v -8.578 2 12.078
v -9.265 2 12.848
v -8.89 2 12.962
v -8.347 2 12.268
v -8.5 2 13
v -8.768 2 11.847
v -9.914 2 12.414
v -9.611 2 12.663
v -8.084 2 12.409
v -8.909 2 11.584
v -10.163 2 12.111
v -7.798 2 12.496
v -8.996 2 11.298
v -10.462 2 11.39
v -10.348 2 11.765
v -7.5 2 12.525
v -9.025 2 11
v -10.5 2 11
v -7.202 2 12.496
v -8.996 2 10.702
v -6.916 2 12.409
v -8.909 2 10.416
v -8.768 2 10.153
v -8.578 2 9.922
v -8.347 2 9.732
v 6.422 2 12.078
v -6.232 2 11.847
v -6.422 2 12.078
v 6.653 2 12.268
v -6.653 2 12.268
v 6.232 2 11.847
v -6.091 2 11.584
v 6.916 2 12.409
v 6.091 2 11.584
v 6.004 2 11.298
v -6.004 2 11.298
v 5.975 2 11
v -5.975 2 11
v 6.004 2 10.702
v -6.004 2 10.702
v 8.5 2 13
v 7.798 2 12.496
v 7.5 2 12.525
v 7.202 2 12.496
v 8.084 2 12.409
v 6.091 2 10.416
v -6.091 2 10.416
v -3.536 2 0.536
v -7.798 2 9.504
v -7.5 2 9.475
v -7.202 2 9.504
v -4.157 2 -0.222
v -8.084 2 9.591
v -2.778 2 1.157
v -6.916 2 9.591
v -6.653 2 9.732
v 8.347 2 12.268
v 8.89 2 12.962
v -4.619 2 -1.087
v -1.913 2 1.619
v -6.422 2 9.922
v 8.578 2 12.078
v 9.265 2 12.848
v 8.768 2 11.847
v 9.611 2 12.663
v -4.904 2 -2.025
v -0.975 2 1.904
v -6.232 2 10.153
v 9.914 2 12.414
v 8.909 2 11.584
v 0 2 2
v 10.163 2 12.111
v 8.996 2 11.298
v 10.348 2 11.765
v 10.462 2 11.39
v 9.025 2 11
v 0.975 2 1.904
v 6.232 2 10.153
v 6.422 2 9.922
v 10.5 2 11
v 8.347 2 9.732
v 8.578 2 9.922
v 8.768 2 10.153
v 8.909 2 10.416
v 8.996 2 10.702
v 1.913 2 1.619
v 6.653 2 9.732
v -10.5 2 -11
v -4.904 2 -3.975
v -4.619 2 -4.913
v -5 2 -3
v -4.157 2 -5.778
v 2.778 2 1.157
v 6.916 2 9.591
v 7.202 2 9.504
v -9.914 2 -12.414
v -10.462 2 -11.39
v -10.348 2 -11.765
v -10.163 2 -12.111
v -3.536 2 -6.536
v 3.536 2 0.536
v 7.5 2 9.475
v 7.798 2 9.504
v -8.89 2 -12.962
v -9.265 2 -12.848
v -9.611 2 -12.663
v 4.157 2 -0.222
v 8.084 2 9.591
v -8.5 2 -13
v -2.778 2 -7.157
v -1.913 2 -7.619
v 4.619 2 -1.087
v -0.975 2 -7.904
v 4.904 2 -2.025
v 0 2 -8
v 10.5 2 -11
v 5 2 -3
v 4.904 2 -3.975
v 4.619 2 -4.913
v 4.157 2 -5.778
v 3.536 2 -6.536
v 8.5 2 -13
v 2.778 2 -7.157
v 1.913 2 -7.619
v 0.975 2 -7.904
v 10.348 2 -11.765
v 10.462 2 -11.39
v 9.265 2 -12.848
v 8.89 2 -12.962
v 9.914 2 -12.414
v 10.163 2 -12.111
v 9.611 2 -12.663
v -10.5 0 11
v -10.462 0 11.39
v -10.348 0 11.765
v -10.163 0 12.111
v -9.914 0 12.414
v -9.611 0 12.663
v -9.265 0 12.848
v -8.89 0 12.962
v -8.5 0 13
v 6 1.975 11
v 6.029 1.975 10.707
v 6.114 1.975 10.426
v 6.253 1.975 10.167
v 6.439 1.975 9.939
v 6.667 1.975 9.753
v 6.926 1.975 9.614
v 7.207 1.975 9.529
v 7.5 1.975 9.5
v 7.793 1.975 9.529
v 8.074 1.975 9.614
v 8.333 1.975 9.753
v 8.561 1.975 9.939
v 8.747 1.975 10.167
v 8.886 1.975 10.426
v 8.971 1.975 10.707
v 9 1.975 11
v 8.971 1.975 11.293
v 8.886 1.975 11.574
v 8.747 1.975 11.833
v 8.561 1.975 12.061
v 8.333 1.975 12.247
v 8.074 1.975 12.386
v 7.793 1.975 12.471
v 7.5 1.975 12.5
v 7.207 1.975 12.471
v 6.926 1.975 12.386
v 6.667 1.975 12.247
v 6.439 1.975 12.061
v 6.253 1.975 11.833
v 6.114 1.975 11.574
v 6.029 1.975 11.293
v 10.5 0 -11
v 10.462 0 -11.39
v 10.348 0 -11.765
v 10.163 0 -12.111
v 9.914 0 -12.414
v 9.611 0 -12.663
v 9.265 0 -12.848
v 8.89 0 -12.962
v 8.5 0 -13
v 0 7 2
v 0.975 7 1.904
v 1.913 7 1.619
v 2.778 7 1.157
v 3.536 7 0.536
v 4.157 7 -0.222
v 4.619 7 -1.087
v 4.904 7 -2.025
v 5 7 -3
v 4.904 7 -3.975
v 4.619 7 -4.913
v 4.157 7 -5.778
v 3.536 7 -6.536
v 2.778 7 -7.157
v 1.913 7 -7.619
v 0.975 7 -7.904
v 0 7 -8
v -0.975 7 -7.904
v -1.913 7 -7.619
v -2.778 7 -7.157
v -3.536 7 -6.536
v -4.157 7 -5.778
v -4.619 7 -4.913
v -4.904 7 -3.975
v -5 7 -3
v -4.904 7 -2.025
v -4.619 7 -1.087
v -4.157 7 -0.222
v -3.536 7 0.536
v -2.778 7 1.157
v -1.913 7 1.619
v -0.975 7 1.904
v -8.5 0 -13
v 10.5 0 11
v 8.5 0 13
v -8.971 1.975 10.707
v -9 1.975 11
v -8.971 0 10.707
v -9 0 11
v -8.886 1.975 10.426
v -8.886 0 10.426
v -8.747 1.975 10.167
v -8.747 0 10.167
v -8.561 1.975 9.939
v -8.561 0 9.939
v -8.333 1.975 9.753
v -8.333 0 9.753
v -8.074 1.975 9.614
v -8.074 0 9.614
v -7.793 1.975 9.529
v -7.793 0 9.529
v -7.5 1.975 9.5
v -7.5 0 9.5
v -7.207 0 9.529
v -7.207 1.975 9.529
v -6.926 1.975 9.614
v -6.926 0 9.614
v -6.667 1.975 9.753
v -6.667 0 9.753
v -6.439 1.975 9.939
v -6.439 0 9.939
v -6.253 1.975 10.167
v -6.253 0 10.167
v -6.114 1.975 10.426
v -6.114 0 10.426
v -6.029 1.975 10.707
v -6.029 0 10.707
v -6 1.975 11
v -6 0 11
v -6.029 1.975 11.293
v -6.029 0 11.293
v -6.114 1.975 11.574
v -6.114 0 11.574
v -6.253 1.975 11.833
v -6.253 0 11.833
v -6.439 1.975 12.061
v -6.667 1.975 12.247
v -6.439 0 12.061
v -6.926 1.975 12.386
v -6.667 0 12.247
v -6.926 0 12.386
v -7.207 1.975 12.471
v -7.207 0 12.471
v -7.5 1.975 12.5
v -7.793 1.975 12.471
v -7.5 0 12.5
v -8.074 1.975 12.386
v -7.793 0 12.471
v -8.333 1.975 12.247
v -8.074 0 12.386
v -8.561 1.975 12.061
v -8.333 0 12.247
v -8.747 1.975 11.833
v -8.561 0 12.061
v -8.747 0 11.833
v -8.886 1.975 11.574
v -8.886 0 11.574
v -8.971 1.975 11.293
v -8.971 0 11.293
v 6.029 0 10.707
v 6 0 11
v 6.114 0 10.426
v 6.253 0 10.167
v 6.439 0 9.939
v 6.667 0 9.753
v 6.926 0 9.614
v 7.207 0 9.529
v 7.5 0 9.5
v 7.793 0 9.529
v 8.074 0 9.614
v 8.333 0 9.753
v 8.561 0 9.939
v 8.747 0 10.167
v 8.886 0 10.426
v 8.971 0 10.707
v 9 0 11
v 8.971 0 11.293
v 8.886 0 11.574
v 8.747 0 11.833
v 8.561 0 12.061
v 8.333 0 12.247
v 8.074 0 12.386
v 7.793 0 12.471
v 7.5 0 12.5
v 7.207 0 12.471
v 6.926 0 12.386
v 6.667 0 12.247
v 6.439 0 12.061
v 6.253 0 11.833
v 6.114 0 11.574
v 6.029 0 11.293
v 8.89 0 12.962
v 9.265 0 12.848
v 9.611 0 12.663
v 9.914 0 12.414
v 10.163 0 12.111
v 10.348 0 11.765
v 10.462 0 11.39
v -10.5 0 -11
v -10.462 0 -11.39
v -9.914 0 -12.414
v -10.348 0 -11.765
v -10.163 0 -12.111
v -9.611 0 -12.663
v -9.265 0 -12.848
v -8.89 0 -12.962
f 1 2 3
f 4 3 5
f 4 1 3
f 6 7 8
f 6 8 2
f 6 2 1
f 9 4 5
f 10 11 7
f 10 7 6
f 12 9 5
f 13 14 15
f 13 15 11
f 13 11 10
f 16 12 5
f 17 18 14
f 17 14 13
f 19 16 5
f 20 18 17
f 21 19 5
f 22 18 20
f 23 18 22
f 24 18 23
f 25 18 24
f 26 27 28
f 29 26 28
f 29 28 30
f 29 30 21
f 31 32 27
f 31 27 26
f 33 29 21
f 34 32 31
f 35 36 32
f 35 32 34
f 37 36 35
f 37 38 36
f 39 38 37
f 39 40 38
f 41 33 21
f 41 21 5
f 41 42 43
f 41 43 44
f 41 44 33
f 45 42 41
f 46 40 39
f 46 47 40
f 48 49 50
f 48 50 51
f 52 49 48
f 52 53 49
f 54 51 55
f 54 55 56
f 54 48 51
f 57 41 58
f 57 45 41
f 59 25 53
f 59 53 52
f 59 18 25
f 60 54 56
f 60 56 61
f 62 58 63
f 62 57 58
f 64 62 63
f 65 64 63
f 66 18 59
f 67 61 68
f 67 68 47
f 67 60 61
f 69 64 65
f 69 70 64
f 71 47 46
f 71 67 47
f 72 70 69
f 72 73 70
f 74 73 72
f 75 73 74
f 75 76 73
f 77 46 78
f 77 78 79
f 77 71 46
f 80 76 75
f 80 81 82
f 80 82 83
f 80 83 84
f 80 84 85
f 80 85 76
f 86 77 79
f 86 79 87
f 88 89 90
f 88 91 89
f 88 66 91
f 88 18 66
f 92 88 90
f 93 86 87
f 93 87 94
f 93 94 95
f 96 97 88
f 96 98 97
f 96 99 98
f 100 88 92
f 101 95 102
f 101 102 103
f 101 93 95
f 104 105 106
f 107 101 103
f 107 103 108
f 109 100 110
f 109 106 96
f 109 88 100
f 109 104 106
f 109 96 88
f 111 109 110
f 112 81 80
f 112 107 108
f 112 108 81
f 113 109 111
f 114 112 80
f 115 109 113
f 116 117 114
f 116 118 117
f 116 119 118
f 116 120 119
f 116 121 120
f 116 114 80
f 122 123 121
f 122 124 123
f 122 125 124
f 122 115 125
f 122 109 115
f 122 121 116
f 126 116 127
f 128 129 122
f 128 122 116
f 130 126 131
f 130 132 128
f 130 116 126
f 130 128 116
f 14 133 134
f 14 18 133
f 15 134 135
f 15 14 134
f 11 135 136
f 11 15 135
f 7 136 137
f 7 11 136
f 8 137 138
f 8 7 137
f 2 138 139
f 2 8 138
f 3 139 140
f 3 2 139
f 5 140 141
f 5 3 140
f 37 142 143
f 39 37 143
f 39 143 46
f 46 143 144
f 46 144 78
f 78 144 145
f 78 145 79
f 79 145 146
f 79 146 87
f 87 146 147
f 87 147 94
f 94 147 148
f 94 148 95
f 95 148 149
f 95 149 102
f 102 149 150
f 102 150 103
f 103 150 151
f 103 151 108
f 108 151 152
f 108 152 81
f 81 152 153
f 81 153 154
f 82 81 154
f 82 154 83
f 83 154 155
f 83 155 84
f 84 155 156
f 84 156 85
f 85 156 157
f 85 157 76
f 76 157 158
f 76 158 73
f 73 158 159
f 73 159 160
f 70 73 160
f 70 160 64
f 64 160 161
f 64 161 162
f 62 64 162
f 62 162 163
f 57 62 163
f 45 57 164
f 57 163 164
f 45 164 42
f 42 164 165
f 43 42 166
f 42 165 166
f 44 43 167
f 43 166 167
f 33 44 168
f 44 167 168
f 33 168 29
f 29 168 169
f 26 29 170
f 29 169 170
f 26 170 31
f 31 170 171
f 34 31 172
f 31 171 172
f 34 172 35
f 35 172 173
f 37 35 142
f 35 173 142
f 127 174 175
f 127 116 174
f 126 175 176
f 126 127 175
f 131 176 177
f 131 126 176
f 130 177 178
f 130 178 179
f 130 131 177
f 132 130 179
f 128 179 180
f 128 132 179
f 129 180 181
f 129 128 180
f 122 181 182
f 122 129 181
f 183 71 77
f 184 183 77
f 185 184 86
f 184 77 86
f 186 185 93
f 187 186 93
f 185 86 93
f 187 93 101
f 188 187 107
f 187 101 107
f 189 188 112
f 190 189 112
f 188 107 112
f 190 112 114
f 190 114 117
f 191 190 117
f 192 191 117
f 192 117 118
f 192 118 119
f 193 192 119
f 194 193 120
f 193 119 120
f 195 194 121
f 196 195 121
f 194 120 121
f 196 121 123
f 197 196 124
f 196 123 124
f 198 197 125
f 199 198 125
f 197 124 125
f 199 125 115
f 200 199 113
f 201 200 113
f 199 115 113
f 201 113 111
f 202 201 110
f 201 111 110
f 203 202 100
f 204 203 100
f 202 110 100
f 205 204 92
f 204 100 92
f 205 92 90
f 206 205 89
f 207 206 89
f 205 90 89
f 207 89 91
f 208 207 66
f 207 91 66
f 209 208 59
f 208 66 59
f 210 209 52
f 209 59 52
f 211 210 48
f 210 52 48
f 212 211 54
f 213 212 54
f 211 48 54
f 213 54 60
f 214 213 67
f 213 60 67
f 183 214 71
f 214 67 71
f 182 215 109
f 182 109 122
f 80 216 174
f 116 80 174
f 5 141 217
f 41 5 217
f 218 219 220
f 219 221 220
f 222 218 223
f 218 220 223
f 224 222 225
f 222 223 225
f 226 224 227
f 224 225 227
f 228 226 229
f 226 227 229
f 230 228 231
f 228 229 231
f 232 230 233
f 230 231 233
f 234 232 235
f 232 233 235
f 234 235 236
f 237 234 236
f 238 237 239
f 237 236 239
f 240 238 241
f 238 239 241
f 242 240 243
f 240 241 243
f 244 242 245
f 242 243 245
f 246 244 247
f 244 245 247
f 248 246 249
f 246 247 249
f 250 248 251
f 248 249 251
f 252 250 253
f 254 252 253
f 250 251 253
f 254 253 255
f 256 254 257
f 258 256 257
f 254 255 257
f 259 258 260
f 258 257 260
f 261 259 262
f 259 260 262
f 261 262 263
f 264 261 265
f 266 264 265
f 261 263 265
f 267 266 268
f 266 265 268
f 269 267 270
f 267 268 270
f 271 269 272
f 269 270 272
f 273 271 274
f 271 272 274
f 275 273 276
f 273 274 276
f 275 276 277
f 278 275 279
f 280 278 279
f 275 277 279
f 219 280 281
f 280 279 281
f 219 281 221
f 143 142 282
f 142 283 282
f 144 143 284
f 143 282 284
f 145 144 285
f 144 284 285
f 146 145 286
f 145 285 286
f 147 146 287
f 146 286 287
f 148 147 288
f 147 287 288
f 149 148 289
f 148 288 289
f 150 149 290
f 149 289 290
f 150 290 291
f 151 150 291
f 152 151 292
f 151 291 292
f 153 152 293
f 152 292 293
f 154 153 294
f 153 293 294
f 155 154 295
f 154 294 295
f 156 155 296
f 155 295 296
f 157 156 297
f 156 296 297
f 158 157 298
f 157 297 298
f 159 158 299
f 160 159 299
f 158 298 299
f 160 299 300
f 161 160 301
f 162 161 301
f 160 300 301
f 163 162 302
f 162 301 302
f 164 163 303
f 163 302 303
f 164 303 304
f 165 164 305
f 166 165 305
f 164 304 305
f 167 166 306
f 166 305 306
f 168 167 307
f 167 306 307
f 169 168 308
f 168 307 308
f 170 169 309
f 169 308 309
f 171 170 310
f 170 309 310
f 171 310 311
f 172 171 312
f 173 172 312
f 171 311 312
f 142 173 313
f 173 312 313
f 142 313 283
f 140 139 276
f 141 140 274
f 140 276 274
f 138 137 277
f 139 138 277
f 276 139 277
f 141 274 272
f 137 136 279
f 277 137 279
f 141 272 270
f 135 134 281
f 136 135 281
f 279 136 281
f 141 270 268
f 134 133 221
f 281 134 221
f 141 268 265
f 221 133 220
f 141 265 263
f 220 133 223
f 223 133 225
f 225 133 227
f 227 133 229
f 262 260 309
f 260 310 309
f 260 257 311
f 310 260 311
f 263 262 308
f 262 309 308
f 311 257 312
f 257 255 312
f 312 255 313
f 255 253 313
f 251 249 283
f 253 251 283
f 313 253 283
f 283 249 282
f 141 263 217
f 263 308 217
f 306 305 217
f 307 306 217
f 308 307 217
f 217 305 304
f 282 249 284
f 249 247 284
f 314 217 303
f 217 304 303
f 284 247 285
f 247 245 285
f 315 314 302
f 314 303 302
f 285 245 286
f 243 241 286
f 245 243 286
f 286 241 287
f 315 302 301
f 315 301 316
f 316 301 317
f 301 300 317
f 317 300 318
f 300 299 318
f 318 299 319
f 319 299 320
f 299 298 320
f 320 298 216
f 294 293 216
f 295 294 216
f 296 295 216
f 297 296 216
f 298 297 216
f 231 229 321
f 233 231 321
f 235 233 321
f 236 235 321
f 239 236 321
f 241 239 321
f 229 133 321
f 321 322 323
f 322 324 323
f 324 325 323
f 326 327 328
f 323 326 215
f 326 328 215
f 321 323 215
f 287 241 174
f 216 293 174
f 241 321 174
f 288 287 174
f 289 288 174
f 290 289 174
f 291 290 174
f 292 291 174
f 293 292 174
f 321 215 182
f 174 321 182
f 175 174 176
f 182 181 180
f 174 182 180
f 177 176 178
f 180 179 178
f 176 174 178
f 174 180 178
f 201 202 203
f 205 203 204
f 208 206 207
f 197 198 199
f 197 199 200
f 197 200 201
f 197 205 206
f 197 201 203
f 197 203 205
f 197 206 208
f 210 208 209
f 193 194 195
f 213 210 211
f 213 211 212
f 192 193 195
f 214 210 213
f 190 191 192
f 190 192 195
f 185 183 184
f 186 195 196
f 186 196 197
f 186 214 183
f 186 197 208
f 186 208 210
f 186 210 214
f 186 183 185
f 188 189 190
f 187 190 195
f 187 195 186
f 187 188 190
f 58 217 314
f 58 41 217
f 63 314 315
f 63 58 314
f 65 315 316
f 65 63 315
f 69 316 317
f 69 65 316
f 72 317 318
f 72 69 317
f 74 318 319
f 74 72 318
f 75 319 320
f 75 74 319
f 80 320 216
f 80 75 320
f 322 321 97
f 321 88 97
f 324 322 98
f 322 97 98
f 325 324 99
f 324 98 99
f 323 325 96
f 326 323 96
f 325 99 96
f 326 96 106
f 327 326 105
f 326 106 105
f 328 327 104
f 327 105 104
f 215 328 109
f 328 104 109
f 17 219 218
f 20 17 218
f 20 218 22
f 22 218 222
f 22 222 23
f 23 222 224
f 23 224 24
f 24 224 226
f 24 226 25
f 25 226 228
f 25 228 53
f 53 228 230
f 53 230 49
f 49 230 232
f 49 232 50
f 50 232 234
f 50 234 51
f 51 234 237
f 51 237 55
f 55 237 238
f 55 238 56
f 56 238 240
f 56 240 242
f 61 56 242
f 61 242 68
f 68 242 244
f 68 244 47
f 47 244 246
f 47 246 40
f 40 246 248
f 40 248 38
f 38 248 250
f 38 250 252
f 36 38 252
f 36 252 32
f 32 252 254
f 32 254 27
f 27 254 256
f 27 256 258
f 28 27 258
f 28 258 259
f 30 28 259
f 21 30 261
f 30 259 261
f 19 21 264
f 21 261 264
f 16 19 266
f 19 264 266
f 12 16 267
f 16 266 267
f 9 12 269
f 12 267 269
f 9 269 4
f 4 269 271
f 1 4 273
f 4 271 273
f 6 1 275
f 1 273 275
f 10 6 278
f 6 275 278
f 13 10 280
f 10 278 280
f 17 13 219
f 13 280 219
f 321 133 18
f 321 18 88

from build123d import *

# Parameters (mm, degrees)
SKETCH1_W                          = 21
SKETCH1_H                          = 26
BOSS_EXTRUDE1_DEPTH                = 2
FILLET1_R                          = 2
SKETCH2_R                          = 5
BOSS_EXTRUDE2_DEPTH                = 5
F_3_0_3_DIAMETER_HOLE1_D           = 3
F_3_0_3_DIAMETER_HOLE1_CSINK_D     = 3.05
F_3_0_3_DIAMETER_HOLE1_CSINK_ANGLE = 90


with BuildPart() as part:
    # Sketch1 → Boss-Extrude1 (new body)
    with BuildSketch(Plane(origin=(0, 0, 0), x_dir=(1, 0, 0), z_dir=(0, 1, 0))):
        Rectangle(SKETCH1_W, SKETCH1_H)
    extrude(amount=BOSS_EXTRUDE1_DEPTH)

    # Fillet1
    fillet1_edges = [part.edges().sort_by_distance(p)[0] for p in [
        (10.5, 1, 13),
        (-10.5, 1, 13),
        (-10.5, 1, -13),
        (10.5, 1, -13),
    ]]
    fillet(fillet1_edges, radius=FILLET1_R)

    # Sketch2 → Boss-Extrude2 (add)
    with BuildSketch(Plane(origin=(0, 2, 0), x_dir=(1, 0, 0), z_dir=(0, 1, 0))):
        with Locations(Location((0, 3, 0), (0, 0, 270))):
            Circle(SKETCH2_R)
    extrude(amount=BOSS_EXTRUDE2_DEPTH)

    # Ø3.0 (3) Diameter Hole1 (through all)
    with Locations(Plane(origin=(0, 2, 0), x_dir=(1, 0, 0), z_dir=(0, 1, 0))):
        with Locations((-7.5, -11), (7.5, -11)):
            CounterSinkHole(F_3_0_3_DIAMETER_HOLE1_D / 2, F_3_0_3_DIAMETER_HOLE1_CSINK_D / 2, counter_sink_angle=F_3_0_3_DIAMETER_HOLE1_CSINK_ANGLE)


solid = part.part
